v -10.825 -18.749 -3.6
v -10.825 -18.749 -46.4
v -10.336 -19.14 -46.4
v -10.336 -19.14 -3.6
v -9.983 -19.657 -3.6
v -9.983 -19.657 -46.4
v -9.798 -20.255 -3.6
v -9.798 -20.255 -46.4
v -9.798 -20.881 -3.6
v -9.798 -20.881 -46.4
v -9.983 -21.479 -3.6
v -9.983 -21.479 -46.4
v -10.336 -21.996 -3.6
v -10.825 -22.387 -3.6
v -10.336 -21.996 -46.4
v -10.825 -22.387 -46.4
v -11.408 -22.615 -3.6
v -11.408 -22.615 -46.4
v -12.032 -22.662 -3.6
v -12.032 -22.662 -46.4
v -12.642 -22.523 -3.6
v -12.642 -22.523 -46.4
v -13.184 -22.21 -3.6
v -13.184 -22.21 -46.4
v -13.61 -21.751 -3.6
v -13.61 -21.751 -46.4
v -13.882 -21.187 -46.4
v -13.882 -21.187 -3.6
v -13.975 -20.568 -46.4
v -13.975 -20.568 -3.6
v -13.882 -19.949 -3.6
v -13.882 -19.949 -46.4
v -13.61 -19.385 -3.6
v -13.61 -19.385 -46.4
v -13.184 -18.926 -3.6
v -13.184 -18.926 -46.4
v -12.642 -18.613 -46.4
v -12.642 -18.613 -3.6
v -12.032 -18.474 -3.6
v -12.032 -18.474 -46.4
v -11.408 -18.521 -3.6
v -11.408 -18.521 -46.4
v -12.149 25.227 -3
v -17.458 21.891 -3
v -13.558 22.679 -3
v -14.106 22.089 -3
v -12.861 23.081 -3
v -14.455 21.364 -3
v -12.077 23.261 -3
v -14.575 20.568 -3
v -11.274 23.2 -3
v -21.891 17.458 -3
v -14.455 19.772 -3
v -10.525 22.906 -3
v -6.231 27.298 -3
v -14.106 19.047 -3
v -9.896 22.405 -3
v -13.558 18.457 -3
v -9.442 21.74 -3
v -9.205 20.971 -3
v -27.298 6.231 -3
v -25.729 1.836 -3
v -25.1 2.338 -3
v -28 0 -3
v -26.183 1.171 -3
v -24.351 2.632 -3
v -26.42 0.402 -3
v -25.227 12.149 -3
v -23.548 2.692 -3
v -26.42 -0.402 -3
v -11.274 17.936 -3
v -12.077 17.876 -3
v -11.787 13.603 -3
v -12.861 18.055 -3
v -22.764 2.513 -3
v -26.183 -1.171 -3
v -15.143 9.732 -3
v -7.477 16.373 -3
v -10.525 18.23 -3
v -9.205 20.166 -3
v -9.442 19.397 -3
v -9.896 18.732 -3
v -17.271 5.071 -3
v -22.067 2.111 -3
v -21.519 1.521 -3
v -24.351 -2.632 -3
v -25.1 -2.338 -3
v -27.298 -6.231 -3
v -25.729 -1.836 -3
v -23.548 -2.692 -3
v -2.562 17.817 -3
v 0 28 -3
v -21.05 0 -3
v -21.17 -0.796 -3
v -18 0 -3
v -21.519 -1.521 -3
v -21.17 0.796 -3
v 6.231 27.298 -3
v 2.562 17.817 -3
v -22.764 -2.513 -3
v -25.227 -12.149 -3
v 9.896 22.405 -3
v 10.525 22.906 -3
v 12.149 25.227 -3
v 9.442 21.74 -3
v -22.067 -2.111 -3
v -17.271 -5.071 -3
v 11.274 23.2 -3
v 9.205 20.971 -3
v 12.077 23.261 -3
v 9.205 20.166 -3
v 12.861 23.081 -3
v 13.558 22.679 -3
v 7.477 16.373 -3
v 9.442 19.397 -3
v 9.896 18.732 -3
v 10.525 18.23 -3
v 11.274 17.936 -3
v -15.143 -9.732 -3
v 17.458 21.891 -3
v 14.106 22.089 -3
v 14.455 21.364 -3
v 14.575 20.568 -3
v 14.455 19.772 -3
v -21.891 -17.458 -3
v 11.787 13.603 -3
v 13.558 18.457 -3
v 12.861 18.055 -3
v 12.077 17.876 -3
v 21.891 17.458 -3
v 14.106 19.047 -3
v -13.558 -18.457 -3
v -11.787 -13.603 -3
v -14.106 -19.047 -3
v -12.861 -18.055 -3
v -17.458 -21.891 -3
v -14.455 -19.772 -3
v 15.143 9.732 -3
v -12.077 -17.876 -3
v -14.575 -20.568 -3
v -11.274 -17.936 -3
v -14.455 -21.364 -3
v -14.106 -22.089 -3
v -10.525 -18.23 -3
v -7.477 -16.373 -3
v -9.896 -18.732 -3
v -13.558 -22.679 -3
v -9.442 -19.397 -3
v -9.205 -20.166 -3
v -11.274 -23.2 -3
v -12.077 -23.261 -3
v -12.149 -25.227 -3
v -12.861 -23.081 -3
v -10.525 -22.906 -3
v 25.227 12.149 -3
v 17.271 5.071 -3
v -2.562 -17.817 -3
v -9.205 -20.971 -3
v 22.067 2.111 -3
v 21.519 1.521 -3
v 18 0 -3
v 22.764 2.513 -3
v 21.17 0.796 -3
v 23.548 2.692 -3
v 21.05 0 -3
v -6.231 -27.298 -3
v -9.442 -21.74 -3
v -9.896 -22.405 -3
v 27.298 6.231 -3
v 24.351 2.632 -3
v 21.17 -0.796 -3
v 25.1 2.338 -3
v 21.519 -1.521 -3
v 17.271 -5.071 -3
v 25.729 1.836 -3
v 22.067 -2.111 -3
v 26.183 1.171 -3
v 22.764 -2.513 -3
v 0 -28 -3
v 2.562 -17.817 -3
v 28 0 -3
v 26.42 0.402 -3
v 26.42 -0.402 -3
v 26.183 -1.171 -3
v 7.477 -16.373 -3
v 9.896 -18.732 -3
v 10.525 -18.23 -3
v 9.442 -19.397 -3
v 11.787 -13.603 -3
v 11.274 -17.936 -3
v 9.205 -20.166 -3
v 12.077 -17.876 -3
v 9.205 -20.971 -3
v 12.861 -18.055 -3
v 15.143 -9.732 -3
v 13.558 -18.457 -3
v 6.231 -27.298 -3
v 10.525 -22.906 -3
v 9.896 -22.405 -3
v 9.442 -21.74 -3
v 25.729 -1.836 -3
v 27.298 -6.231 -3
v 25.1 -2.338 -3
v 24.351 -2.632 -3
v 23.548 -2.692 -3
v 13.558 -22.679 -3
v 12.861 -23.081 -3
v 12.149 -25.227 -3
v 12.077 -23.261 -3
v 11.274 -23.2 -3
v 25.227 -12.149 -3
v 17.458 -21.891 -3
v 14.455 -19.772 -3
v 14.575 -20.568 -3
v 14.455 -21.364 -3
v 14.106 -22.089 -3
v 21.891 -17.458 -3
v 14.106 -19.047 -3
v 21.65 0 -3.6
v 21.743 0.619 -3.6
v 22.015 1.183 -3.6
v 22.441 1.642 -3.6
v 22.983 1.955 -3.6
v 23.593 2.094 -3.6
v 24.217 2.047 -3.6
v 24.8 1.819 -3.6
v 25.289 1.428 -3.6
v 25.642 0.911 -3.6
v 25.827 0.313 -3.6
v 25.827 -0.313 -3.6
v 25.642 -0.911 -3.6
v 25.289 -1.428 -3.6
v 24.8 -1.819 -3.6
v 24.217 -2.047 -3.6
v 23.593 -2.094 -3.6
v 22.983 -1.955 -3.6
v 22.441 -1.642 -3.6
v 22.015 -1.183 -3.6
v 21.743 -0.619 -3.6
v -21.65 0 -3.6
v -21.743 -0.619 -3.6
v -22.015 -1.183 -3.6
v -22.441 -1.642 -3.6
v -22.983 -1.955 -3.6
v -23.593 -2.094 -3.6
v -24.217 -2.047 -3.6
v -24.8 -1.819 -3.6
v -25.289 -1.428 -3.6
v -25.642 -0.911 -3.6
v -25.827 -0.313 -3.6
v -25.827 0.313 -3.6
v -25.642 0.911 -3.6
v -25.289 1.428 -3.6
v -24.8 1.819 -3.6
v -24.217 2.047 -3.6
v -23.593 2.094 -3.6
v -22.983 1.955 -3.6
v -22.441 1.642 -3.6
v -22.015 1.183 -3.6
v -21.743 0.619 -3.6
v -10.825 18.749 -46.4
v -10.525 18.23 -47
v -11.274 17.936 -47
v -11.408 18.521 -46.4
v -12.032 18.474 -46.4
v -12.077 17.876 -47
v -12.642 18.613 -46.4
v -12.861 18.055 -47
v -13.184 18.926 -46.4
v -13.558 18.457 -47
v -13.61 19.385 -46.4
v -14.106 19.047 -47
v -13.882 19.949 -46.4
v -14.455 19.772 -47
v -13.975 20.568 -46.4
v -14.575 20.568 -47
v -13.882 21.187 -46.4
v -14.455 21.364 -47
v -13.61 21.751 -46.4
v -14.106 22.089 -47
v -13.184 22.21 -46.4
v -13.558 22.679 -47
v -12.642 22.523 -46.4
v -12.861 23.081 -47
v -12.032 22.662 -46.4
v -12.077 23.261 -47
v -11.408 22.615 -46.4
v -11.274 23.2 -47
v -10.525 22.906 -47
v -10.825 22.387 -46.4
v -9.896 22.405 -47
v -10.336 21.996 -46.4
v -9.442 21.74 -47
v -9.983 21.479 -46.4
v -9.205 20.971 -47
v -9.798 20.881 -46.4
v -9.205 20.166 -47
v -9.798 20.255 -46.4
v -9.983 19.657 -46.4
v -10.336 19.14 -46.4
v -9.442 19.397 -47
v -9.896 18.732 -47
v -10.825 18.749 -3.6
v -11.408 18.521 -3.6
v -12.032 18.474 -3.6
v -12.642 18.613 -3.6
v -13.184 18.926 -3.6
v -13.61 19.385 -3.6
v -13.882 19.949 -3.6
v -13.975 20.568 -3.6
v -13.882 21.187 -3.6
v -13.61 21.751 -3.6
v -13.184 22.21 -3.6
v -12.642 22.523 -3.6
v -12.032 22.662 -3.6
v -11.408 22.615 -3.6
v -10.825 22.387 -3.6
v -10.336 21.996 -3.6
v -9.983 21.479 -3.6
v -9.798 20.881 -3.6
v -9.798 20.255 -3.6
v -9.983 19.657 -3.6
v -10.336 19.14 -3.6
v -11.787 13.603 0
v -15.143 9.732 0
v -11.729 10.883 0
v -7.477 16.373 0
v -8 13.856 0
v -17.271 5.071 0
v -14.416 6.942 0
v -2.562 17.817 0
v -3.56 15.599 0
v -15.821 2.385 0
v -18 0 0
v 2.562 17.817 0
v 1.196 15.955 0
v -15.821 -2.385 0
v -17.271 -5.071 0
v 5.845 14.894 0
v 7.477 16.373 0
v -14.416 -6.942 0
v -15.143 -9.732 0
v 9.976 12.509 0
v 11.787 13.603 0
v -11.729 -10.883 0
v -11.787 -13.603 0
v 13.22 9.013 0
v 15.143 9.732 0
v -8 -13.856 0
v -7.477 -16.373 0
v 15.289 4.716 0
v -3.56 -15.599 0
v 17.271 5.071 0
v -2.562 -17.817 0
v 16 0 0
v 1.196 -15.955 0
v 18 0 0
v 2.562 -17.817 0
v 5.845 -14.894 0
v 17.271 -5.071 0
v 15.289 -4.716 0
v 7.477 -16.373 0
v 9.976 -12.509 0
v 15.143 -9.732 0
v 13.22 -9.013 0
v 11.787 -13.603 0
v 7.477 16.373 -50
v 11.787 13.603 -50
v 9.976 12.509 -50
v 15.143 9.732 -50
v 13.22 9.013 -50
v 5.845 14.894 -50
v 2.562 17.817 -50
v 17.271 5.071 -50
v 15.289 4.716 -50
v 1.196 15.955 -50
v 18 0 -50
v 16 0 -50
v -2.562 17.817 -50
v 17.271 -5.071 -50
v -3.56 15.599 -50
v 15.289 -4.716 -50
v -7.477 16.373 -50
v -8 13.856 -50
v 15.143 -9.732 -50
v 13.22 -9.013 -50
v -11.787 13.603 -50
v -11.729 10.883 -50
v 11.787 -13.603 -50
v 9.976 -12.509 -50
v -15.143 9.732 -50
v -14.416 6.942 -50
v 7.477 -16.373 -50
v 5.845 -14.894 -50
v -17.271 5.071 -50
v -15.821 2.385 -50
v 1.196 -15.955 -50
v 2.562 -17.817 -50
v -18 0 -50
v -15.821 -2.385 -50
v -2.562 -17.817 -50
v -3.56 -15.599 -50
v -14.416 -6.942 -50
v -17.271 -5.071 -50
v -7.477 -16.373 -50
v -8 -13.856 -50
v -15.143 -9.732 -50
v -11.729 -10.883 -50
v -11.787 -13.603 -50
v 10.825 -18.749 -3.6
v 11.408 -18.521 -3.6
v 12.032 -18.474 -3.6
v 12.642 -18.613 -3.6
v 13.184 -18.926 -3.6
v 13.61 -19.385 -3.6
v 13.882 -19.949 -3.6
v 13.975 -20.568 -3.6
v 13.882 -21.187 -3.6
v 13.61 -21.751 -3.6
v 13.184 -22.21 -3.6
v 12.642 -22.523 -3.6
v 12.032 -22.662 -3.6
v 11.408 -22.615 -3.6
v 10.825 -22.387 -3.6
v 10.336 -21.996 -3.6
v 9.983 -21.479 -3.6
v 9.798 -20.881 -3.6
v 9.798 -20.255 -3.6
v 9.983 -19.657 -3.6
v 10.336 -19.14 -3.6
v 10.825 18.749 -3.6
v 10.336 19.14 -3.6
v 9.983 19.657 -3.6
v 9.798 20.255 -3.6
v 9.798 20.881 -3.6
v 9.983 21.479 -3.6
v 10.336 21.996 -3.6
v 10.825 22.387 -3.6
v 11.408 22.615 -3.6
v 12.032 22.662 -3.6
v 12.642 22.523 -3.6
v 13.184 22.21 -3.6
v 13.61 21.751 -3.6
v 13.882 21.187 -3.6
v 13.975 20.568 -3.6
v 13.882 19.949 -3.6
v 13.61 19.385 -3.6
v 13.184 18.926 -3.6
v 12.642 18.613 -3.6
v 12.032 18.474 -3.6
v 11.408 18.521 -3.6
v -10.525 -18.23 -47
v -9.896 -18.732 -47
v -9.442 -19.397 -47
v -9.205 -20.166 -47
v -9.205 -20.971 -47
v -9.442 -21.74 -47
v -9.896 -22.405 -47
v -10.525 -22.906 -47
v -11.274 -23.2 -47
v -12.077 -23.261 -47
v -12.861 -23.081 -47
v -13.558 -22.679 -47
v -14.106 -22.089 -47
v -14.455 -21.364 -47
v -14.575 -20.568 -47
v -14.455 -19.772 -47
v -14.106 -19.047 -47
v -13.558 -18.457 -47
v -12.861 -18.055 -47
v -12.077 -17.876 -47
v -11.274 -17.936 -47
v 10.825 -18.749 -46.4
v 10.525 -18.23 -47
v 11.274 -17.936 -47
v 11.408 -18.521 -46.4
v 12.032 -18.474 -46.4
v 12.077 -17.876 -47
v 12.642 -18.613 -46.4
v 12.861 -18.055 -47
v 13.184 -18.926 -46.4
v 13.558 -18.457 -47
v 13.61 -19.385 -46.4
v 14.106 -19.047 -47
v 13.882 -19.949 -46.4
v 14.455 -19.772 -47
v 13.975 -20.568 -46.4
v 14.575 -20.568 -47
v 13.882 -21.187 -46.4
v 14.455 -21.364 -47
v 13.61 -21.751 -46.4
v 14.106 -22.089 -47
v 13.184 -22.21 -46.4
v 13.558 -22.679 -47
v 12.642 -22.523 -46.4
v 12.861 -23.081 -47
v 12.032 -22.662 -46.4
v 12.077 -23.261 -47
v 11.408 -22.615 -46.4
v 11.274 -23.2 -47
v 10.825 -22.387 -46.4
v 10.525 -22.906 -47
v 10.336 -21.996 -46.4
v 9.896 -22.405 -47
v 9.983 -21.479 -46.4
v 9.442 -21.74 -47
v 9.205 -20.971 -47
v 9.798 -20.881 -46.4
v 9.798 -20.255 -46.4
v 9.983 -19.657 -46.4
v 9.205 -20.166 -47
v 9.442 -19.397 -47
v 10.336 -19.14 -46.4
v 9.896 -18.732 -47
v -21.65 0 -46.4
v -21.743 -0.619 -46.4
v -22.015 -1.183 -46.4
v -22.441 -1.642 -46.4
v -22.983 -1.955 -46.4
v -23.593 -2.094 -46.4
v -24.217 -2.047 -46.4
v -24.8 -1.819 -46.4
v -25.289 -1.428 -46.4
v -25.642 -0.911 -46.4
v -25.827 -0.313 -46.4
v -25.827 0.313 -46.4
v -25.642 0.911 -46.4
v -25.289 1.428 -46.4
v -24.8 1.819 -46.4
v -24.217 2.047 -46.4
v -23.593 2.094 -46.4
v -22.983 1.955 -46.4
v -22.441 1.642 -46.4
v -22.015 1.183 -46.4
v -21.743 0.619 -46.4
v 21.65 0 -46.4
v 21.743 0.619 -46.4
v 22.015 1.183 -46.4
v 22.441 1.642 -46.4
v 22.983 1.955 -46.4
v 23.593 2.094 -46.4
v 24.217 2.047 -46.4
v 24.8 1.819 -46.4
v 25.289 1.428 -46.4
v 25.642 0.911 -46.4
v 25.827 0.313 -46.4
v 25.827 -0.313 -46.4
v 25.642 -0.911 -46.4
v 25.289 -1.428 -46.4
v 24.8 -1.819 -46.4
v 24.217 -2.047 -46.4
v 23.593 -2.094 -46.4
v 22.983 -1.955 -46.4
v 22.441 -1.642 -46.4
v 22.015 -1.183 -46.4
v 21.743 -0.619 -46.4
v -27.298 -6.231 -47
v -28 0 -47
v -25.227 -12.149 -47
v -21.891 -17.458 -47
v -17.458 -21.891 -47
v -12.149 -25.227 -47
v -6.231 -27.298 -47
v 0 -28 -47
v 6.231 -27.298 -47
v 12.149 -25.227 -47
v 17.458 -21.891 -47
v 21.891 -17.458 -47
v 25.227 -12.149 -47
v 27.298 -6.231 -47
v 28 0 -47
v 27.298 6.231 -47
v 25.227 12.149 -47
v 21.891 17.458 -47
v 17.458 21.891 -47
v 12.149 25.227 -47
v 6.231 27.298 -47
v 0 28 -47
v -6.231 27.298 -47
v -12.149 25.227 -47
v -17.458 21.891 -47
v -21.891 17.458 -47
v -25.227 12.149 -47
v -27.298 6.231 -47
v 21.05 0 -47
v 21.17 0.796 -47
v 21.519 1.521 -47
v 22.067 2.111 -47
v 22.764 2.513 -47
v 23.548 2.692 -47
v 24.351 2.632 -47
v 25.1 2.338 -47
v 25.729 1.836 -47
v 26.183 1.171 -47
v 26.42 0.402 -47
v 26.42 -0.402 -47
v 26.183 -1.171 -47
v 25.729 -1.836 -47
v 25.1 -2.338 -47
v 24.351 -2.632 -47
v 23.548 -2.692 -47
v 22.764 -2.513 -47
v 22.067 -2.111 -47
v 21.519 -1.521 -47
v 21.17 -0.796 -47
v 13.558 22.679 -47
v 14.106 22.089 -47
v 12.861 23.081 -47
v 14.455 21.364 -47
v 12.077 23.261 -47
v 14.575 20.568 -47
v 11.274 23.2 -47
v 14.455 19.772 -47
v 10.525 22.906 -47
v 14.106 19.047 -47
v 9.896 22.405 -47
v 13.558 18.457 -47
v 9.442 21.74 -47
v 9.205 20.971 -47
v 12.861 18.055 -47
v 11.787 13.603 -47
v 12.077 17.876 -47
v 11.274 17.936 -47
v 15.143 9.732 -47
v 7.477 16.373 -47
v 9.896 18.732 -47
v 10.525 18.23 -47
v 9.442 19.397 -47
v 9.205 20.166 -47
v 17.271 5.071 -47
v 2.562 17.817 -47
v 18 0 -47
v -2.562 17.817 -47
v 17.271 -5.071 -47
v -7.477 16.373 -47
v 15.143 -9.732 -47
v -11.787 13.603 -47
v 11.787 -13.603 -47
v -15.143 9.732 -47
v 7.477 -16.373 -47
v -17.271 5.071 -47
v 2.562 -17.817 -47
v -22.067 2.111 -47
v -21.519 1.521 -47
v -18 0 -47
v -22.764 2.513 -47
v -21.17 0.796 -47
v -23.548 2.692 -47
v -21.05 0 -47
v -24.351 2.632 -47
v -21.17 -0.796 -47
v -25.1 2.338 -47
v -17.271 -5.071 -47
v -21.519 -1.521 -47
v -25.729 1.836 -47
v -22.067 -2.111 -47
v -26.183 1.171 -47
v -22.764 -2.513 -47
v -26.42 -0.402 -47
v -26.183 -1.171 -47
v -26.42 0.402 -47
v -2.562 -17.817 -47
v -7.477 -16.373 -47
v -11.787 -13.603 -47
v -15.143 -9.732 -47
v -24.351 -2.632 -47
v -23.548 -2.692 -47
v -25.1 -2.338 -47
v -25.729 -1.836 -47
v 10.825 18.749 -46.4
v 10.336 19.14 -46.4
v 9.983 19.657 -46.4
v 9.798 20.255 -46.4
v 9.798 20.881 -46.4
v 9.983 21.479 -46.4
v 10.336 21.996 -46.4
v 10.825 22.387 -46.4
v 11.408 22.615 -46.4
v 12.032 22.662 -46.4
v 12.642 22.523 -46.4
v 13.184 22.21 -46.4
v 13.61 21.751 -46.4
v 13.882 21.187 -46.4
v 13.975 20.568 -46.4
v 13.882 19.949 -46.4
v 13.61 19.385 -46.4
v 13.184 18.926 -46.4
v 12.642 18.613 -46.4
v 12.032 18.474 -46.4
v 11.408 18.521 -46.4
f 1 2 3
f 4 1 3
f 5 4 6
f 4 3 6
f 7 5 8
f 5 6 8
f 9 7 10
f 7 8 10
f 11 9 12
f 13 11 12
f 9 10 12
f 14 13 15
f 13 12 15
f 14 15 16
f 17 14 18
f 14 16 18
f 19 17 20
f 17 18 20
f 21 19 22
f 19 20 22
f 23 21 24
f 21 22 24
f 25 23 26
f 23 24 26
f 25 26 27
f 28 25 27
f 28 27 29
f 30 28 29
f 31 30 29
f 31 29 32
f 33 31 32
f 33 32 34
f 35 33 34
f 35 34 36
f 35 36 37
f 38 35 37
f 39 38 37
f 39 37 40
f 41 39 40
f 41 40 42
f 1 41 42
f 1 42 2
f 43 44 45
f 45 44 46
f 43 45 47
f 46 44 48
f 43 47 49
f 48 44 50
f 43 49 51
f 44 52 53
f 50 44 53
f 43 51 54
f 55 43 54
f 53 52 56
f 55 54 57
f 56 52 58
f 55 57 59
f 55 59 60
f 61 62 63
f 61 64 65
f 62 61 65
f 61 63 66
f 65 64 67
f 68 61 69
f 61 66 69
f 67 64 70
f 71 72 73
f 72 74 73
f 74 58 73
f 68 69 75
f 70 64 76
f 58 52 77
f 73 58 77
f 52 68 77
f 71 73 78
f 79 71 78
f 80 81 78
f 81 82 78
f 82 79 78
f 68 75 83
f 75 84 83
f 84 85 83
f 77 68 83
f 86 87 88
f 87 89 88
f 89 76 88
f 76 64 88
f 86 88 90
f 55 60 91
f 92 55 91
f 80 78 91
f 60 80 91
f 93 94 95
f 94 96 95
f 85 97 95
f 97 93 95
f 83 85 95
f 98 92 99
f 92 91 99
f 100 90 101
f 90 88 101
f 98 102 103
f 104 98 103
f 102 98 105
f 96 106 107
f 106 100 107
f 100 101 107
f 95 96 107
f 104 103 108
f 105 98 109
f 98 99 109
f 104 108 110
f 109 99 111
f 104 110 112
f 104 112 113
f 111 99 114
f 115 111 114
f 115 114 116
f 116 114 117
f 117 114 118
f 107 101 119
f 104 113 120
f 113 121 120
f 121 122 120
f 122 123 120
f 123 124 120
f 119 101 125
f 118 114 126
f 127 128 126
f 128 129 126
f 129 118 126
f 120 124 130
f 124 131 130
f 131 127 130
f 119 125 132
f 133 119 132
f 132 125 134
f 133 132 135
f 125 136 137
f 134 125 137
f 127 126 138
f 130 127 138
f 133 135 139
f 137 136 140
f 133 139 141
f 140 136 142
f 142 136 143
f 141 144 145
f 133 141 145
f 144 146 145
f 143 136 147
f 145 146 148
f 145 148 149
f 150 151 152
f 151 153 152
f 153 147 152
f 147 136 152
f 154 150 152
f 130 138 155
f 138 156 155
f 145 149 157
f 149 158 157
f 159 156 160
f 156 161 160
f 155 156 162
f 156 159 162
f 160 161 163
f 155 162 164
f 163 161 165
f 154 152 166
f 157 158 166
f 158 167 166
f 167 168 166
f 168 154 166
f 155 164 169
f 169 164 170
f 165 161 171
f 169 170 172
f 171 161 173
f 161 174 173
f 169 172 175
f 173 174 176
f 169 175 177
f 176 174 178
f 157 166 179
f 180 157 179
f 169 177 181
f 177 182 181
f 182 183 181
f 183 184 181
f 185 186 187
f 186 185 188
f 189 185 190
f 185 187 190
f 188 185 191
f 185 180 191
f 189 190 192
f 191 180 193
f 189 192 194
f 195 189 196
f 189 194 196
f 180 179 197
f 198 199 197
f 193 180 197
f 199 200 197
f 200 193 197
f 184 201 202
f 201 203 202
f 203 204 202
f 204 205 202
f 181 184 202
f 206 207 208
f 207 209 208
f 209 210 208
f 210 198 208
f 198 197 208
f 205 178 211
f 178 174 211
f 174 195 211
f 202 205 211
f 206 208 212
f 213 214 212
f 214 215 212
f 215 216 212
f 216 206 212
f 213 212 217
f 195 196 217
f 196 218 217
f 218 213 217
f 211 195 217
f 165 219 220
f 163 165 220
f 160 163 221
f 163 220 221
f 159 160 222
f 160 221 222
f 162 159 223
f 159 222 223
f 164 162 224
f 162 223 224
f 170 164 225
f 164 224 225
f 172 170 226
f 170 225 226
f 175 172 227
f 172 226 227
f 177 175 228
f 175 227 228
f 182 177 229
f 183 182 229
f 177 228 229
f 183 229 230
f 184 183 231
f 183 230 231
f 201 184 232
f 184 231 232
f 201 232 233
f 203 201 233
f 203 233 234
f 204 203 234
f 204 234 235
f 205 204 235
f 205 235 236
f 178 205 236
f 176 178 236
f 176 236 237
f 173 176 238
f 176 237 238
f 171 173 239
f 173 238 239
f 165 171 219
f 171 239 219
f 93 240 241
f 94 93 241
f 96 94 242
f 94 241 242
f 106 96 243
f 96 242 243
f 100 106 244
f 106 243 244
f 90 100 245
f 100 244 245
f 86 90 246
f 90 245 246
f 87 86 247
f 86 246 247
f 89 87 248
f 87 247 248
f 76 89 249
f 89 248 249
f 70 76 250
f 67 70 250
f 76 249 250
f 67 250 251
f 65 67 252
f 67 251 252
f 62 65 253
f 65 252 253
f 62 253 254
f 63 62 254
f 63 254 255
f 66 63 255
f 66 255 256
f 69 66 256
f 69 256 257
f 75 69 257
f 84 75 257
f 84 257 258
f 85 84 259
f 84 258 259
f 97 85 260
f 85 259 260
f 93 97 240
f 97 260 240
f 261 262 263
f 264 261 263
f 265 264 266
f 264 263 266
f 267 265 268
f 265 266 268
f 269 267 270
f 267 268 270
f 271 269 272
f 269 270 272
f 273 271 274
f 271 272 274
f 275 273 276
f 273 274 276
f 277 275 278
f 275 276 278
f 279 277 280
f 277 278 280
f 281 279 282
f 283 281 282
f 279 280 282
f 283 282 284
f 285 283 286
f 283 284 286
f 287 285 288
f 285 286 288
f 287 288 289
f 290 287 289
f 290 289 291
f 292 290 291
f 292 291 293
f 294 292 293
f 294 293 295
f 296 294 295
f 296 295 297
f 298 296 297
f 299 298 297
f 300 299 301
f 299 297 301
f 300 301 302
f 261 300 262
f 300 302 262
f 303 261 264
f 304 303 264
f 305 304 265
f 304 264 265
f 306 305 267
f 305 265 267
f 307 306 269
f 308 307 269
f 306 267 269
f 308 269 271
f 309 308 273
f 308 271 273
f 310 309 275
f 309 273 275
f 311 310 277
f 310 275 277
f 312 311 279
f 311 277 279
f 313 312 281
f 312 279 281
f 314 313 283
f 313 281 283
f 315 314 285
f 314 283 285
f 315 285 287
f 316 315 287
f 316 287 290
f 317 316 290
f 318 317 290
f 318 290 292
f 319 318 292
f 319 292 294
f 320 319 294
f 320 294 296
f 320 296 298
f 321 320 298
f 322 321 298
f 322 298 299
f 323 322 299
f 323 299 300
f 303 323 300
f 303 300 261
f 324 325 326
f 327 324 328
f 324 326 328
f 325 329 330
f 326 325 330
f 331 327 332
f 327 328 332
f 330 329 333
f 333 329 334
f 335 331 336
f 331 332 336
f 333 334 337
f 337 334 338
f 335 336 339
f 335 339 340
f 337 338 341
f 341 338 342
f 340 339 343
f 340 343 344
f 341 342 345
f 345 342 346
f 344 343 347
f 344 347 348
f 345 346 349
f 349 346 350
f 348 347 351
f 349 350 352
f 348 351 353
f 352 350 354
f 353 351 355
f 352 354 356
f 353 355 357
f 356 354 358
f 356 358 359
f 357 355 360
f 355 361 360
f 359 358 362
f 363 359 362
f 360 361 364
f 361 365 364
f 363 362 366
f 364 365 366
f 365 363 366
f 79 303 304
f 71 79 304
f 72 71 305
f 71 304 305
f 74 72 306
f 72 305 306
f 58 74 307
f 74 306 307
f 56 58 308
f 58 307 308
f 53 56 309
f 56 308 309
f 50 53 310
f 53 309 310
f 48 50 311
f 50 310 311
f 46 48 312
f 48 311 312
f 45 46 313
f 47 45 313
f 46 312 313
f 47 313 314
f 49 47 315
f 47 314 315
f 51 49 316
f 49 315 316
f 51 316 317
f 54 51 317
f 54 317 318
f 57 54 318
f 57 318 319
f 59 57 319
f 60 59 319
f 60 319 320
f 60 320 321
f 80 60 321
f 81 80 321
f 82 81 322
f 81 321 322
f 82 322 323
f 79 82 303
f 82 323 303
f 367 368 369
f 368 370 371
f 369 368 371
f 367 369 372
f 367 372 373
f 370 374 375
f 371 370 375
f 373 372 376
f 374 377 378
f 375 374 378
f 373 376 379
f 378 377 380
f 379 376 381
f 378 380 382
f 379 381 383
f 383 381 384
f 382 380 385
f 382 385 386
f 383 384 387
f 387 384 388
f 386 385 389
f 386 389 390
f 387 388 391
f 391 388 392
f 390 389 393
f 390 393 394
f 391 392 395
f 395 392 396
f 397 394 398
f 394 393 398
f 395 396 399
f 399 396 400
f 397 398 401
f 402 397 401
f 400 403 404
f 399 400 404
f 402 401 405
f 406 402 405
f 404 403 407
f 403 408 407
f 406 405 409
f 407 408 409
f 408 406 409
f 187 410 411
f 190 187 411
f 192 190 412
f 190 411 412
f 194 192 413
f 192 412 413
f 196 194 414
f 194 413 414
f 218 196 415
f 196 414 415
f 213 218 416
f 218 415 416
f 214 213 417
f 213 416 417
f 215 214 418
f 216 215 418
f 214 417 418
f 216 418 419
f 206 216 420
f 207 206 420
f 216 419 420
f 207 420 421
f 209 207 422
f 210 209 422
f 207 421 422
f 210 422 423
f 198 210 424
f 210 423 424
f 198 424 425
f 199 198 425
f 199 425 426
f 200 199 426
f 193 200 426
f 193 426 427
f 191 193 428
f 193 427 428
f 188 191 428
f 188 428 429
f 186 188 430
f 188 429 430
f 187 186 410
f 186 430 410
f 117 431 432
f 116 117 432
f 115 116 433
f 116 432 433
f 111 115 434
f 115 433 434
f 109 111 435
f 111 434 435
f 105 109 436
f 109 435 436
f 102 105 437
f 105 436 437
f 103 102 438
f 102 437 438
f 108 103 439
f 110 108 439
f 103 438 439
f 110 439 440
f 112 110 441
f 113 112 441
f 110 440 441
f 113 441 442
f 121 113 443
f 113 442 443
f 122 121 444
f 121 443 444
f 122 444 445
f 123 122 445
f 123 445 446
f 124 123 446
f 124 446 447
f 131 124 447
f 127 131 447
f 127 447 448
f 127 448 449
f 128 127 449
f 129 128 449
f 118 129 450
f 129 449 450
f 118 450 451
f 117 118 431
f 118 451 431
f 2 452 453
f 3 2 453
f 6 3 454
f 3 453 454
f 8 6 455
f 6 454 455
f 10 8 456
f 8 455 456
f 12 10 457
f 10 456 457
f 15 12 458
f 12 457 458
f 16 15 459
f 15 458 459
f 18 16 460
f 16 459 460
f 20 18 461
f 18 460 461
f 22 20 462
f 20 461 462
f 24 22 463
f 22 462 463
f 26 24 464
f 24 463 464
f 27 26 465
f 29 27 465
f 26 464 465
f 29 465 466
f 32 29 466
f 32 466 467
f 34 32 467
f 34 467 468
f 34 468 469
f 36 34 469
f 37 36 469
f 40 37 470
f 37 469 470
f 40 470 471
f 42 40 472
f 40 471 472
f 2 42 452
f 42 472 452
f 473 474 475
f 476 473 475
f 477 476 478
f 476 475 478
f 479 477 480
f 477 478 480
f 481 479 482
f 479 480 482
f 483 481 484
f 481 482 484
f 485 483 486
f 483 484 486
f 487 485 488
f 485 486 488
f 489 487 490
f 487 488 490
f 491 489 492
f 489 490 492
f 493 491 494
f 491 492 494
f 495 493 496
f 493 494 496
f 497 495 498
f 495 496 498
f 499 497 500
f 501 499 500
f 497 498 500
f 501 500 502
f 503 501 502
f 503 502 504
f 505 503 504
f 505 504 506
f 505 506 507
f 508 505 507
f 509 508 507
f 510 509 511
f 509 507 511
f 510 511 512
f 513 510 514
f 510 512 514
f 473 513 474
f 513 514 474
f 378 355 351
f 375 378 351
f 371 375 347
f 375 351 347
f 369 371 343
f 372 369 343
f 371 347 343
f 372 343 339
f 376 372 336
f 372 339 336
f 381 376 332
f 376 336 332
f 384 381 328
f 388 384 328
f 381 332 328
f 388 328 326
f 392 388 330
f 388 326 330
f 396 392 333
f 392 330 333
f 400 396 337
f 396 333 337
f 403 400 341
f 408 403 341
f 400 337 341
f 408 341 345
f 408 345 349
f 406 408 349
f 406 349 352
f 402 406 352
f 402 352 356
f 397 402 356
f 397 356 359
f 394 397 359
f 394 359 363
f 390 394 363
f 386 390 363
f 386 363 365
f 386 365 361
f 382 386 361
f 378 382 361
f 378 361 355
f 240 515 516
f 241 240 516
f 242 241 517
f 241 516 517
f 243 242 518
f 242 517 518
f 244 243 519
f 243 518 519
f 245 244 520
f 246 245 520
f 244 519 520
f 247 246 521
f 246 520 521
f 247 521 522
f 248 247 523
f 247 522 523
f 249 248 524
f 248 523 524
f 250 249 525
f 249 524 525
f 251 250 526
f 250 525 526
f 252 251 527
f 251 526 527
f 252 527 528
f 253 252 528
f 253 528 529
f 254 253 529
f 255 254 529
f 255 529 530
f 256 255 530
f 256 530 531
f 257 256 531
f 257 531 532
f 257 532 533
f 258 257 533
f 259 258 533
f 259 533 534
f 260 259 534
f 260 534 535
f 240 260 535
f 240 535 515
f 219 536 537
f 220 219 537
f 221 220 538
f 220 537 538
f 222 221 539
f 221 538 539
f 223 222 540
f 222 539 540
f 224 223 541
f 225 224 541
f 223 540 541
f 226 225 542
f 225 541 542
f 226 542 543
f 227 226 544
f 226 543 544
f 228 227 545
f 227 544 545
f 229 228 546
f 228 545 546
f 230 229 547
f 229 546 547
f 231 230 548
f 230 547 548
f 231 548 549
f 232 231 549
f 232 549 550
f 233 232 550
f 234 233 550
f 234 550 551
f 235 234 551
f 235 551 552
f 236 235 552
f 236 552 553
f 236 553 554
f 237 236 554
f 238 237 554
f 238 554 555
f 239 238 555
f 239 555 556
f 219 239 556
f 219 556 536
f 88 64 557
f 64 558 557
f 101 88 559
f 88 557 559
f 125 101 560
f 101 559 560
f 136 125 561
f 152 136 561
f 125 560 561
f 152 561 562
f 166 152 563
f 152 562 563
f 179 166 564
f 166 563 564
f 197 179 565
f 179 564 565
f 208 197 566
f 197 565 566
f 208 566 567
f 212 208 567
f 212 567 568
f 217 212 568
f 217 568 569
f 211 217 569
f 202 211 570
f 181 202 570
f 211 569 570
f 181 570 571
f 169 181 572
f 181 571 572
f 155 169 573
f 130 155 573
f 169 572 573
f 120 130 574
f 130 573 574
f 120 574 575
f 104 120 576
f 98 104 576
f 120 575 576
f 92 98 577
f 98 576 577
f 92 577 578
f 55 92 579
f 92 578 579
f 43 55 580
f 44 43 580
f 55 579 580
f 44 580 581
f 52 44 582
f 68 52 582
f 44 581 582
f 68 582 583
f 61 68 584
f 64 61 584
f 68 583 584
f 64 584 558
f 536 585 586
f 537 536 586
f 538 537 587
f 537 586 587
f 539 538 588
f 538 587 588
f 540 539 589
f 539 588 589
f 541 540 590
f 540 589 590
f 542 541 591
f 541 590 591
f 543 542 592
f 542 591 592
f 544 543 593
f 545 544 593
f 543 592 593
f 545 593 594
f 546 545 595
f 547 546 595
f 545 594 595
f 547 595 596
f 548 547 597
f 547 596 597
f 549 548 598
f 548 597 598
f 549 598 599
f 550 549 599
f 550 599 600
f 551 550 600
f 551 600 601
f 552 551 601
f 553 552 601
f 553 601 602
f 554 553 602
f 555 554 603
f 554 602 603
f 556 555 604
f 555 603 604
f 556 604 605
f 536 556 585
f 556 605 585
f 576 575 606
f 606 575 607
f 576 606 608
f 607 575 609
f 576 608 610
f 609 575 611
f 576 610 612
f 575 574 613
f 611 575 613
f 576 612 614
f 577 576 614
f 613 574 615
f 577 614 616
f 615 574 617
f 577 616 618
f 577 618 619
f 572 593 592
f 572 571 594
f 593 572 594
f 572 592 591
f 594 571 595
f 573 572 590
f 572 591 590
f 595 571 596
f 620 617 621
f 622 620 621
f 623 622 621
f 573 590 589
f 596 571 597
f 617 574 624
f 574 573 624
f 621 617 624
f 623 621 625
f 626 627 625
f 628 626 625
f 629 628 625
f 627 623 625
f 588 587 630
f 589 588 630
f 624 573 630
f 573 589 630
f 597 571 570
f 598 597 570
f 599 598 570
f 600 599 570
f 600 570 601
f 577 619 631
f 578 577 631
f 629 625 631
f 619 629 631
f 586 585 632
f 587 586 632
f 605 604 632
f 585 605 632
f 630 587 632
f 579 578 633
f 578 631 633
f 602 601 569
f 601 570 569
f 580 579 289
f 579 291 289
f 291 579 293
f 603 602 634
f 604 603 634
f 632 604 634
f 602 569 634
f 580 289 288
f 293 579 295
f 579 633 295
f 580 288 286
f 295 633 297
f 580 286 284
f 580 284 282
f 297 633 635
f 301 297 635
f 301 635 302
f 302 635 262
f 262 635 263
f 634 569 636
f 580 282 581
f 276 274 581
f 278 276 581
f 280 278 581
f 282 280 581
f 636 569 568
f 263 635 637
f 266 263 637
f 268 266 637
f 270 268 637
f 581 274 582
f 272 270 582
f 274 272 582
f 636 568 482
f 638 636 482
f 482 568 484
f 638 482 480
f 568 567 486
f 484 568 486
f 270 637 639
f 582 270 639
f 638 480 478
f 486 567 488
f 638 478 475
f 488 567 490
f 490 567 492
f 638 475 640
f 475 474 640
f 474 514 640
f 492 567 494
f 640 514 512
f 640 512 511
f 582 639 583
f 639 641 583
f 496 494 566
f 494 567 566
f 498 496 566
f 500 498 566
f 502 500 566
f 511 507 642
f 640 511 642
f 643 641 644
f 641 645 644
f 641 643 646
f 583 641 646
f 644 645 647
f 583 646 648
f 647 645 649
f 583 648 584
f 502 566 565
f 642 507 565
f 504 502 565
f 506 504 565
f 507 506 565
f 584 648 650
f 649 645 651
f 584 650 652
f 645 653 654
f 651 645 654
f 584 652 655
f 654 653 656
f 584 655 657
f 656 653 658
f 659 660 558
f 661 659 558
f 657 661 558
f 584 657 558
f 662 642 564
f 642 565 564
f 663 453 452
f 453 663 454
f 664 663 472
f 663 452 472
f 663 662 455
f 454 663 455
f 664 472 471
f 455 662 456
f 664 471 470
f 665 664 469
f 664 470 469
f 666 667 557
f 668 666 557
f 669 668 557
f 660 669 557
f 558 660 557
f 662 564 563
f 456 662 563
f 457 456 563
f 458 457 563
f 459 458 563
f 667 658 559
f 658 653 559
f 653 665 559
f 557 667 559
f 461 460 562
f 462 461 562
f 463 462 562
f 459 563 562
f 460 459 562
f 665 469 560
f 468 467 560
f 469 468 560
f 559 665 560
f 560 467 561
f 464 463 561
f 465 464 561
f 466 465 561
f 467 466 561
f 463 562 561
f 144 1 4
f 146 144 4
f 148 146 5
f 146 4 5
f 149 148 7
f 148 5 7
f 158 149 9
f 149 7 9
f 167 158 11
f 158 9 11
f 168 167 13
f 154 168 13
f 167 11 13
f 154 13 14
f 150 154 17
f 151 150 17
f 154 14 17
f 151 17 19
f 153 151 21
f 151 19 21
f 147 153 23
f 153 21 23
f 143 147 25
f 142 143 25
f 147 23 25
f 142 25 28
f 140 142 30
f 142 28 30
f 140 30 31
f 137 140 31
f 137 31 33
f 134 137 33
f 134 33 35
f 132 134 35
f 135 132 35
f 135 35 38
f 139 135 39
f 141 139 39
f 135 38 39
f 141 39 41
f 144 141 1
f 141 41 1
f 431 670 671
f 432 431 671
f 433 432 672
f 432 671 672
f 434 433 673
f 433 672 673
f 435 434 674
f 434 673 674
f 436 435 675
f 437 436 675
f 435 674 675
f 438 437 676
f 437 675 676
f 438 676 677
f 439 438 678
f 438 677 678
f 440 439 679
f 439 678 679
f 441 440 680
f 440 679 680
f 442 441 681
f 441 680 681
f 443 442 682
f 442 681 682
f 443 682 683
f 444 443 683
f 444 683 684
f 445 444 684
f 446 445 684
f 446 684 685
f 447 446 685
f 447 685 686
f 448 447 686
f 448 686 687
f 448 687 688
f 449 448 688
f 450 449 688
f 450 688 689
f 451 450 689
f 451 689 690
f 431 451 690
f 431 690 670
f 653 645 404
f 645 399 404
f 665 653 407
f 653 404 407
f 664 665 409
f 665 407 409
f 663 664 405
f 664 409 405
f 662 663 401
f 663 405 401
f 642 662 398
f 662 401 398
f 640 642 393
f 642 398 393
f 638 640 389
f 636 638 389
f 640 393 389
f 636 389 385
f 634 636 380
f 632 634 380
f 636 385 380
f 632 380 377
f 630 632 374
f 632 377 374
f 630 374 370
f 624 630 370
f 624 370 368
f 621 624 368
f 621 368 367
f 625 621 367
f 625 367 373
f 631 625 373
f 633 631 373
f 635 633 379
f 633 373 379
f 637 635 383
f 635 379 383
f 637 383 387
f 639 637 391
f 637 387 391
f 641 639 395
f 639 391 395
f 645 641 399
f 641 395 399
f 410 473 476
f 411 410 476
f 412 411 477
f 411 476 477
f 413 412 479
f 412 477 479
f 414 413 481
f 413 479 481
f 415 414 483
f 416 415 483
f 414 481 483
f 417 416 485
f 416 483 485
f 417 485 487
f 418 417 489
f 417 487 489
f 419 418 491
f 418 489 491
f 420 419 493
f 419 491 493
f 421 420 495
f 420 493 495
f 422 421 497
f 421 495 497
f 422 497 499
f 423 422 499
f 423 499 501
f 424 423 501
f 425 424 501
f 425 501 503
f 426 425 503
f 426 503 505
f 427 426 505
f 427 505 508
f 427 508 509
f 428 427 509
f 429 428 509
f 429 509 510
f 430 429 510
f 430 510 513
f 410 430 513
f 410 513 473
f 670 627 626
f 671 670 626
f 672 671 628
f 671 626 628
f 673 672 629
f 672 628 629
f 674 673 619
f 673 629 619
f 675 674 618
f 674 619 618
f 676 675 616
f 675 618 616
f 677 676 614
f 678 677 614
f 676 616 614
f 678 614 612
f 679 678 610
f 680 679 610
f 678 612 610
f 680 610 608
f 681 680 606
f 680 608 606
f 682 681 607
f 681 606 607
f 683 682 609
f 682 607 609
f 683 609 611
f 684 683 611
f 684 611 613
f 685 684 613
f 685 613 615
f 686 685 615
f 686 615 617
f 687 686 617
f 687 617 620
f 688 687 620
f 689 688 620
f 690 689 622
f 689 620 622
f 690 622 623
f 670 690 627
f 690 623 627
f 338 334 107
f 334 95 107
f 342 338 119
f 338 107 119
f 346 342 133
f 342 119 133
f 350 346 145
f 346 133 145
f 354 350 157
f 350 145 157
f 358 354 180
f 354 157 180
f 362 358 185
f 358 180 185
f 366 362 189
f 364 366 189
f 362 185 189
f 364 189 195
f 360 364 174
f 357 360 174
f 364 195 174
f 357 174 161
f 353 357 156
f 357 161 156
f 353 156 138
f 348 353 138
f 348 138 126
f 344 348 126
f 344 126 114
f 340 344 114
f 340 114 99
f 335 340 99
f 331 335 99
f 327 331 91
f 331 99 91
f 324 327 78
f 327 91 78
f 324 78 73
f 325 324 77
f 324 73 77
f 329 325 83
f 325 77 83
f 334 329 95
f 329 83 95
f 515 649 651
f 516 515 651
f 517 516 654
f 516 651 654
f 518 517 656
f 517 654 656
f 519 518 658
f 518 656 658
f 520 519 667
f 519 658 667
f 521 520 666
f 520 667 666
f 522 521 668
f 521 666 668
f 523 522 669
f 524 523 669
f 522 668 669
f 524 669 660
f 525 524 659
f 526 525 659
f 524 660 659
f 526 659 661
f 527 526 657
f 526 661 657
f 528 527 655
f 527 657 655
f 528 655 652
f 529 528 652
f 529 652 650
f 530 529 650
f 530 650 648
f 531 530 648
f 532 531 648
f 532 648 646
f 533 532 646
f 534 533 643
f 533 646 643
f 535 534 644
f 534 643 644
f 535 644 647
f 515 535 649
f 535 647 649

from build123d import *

# Parameters (mm, degrees)
SKETCH_2_R               = 16
CUT_EXTRUDE_1_DEPTH      = 1
CUT_EXTRUDE_1_DEPTH_BACK = 51
HOLE_WIZARD_M51_D        = 4.2
HOLE_WIZARD_M51_DEPTH    = 44.001
PATTERN_CIRCULAR_1_COUNT = 6
CHAMFER_1_SIZE           = 0.6


with BuildPart() as part:
    # Эскиз1 → Повернуть1 (revolve)
    with BuildSketch(Plane(origin=(0, 0, 0), x_dir=(1, 0, 0), z_dir=(0, 1, 0))):
        Polygon((0, 0), (-18, 0), (-18, 3), (-28, 3), (-28, 47), (-18, 47), (-18, 50), (0, 50), align=None)
    revolve(axis=Axis((0, 0, -50), (0, 0, 1)))

    # Эскиз2 → Вырез-Вытянуть1 (cut, two sides)
    with BuildSketch(Plane.XY) as cut_extrude_1_sk:
        Circle(SKETCH_2_R)
    extrude(amount=CUT_EXTRUDE_1_DEPTH, mode=Mode.SUBTRACT)
    extrude(cut_extrude_1_sk.sketch, amount=-CUT_EXTRUDE_1_DEPTH_BACK, mode=Mode.SUBTRACT)

    # Сверление под метчик M51
    with Locations(Plane(origin=(23.75, 0, -3), x_dir=(1, 0, 0), z_dir=(0, 0, 1))):
        with Locations((0, 0)):
            hole_wizard_m51 = Hole(HOLE_WIZARD_M51_D / 2, depth=HOLE_WIZARD_M51_DEPTH)

    # Круговой массив1: Сверление под метчик M51 ×6 about axis
    pattern_circular_1_axis = Axis((0, 0, 0), (0, 0, 1))
    for i in range(1, PATTERN_CIRCULAR_1_COUNT):
        add(hole_wizard_m51.rotate(pattern_circular_1_axis, i * 360 / PATTERN_CIRCULAR_1_COUNT), mode=Mode.SUBTRACT)

    # Фаска1
    chamfer_1_edges = [part.edges().sort_by_distance(p)[0] for p in [
        (25.85, 0, -3),
        (25.85, 0, -47),
        (12.925, -22.386756688, -3),
        (12.925, -22.386756688, -47),
        (-12.925, -22.386756688, -3),
        (-12.925, -22.386756688, -47),
        (-25.85, 0, -3),
        (-25.85, 0, -47),
        (-12.925, 22.386756688, -3),
        (-12.925, 22.386756688, -47),
        (12.925, 22.386756688, -3),
        (12.925, 22.386756688, -47),
    ]]
    chamfer(chamfer_1_edges, length=CHAMFER_1_SIZE)


solid = part.part
